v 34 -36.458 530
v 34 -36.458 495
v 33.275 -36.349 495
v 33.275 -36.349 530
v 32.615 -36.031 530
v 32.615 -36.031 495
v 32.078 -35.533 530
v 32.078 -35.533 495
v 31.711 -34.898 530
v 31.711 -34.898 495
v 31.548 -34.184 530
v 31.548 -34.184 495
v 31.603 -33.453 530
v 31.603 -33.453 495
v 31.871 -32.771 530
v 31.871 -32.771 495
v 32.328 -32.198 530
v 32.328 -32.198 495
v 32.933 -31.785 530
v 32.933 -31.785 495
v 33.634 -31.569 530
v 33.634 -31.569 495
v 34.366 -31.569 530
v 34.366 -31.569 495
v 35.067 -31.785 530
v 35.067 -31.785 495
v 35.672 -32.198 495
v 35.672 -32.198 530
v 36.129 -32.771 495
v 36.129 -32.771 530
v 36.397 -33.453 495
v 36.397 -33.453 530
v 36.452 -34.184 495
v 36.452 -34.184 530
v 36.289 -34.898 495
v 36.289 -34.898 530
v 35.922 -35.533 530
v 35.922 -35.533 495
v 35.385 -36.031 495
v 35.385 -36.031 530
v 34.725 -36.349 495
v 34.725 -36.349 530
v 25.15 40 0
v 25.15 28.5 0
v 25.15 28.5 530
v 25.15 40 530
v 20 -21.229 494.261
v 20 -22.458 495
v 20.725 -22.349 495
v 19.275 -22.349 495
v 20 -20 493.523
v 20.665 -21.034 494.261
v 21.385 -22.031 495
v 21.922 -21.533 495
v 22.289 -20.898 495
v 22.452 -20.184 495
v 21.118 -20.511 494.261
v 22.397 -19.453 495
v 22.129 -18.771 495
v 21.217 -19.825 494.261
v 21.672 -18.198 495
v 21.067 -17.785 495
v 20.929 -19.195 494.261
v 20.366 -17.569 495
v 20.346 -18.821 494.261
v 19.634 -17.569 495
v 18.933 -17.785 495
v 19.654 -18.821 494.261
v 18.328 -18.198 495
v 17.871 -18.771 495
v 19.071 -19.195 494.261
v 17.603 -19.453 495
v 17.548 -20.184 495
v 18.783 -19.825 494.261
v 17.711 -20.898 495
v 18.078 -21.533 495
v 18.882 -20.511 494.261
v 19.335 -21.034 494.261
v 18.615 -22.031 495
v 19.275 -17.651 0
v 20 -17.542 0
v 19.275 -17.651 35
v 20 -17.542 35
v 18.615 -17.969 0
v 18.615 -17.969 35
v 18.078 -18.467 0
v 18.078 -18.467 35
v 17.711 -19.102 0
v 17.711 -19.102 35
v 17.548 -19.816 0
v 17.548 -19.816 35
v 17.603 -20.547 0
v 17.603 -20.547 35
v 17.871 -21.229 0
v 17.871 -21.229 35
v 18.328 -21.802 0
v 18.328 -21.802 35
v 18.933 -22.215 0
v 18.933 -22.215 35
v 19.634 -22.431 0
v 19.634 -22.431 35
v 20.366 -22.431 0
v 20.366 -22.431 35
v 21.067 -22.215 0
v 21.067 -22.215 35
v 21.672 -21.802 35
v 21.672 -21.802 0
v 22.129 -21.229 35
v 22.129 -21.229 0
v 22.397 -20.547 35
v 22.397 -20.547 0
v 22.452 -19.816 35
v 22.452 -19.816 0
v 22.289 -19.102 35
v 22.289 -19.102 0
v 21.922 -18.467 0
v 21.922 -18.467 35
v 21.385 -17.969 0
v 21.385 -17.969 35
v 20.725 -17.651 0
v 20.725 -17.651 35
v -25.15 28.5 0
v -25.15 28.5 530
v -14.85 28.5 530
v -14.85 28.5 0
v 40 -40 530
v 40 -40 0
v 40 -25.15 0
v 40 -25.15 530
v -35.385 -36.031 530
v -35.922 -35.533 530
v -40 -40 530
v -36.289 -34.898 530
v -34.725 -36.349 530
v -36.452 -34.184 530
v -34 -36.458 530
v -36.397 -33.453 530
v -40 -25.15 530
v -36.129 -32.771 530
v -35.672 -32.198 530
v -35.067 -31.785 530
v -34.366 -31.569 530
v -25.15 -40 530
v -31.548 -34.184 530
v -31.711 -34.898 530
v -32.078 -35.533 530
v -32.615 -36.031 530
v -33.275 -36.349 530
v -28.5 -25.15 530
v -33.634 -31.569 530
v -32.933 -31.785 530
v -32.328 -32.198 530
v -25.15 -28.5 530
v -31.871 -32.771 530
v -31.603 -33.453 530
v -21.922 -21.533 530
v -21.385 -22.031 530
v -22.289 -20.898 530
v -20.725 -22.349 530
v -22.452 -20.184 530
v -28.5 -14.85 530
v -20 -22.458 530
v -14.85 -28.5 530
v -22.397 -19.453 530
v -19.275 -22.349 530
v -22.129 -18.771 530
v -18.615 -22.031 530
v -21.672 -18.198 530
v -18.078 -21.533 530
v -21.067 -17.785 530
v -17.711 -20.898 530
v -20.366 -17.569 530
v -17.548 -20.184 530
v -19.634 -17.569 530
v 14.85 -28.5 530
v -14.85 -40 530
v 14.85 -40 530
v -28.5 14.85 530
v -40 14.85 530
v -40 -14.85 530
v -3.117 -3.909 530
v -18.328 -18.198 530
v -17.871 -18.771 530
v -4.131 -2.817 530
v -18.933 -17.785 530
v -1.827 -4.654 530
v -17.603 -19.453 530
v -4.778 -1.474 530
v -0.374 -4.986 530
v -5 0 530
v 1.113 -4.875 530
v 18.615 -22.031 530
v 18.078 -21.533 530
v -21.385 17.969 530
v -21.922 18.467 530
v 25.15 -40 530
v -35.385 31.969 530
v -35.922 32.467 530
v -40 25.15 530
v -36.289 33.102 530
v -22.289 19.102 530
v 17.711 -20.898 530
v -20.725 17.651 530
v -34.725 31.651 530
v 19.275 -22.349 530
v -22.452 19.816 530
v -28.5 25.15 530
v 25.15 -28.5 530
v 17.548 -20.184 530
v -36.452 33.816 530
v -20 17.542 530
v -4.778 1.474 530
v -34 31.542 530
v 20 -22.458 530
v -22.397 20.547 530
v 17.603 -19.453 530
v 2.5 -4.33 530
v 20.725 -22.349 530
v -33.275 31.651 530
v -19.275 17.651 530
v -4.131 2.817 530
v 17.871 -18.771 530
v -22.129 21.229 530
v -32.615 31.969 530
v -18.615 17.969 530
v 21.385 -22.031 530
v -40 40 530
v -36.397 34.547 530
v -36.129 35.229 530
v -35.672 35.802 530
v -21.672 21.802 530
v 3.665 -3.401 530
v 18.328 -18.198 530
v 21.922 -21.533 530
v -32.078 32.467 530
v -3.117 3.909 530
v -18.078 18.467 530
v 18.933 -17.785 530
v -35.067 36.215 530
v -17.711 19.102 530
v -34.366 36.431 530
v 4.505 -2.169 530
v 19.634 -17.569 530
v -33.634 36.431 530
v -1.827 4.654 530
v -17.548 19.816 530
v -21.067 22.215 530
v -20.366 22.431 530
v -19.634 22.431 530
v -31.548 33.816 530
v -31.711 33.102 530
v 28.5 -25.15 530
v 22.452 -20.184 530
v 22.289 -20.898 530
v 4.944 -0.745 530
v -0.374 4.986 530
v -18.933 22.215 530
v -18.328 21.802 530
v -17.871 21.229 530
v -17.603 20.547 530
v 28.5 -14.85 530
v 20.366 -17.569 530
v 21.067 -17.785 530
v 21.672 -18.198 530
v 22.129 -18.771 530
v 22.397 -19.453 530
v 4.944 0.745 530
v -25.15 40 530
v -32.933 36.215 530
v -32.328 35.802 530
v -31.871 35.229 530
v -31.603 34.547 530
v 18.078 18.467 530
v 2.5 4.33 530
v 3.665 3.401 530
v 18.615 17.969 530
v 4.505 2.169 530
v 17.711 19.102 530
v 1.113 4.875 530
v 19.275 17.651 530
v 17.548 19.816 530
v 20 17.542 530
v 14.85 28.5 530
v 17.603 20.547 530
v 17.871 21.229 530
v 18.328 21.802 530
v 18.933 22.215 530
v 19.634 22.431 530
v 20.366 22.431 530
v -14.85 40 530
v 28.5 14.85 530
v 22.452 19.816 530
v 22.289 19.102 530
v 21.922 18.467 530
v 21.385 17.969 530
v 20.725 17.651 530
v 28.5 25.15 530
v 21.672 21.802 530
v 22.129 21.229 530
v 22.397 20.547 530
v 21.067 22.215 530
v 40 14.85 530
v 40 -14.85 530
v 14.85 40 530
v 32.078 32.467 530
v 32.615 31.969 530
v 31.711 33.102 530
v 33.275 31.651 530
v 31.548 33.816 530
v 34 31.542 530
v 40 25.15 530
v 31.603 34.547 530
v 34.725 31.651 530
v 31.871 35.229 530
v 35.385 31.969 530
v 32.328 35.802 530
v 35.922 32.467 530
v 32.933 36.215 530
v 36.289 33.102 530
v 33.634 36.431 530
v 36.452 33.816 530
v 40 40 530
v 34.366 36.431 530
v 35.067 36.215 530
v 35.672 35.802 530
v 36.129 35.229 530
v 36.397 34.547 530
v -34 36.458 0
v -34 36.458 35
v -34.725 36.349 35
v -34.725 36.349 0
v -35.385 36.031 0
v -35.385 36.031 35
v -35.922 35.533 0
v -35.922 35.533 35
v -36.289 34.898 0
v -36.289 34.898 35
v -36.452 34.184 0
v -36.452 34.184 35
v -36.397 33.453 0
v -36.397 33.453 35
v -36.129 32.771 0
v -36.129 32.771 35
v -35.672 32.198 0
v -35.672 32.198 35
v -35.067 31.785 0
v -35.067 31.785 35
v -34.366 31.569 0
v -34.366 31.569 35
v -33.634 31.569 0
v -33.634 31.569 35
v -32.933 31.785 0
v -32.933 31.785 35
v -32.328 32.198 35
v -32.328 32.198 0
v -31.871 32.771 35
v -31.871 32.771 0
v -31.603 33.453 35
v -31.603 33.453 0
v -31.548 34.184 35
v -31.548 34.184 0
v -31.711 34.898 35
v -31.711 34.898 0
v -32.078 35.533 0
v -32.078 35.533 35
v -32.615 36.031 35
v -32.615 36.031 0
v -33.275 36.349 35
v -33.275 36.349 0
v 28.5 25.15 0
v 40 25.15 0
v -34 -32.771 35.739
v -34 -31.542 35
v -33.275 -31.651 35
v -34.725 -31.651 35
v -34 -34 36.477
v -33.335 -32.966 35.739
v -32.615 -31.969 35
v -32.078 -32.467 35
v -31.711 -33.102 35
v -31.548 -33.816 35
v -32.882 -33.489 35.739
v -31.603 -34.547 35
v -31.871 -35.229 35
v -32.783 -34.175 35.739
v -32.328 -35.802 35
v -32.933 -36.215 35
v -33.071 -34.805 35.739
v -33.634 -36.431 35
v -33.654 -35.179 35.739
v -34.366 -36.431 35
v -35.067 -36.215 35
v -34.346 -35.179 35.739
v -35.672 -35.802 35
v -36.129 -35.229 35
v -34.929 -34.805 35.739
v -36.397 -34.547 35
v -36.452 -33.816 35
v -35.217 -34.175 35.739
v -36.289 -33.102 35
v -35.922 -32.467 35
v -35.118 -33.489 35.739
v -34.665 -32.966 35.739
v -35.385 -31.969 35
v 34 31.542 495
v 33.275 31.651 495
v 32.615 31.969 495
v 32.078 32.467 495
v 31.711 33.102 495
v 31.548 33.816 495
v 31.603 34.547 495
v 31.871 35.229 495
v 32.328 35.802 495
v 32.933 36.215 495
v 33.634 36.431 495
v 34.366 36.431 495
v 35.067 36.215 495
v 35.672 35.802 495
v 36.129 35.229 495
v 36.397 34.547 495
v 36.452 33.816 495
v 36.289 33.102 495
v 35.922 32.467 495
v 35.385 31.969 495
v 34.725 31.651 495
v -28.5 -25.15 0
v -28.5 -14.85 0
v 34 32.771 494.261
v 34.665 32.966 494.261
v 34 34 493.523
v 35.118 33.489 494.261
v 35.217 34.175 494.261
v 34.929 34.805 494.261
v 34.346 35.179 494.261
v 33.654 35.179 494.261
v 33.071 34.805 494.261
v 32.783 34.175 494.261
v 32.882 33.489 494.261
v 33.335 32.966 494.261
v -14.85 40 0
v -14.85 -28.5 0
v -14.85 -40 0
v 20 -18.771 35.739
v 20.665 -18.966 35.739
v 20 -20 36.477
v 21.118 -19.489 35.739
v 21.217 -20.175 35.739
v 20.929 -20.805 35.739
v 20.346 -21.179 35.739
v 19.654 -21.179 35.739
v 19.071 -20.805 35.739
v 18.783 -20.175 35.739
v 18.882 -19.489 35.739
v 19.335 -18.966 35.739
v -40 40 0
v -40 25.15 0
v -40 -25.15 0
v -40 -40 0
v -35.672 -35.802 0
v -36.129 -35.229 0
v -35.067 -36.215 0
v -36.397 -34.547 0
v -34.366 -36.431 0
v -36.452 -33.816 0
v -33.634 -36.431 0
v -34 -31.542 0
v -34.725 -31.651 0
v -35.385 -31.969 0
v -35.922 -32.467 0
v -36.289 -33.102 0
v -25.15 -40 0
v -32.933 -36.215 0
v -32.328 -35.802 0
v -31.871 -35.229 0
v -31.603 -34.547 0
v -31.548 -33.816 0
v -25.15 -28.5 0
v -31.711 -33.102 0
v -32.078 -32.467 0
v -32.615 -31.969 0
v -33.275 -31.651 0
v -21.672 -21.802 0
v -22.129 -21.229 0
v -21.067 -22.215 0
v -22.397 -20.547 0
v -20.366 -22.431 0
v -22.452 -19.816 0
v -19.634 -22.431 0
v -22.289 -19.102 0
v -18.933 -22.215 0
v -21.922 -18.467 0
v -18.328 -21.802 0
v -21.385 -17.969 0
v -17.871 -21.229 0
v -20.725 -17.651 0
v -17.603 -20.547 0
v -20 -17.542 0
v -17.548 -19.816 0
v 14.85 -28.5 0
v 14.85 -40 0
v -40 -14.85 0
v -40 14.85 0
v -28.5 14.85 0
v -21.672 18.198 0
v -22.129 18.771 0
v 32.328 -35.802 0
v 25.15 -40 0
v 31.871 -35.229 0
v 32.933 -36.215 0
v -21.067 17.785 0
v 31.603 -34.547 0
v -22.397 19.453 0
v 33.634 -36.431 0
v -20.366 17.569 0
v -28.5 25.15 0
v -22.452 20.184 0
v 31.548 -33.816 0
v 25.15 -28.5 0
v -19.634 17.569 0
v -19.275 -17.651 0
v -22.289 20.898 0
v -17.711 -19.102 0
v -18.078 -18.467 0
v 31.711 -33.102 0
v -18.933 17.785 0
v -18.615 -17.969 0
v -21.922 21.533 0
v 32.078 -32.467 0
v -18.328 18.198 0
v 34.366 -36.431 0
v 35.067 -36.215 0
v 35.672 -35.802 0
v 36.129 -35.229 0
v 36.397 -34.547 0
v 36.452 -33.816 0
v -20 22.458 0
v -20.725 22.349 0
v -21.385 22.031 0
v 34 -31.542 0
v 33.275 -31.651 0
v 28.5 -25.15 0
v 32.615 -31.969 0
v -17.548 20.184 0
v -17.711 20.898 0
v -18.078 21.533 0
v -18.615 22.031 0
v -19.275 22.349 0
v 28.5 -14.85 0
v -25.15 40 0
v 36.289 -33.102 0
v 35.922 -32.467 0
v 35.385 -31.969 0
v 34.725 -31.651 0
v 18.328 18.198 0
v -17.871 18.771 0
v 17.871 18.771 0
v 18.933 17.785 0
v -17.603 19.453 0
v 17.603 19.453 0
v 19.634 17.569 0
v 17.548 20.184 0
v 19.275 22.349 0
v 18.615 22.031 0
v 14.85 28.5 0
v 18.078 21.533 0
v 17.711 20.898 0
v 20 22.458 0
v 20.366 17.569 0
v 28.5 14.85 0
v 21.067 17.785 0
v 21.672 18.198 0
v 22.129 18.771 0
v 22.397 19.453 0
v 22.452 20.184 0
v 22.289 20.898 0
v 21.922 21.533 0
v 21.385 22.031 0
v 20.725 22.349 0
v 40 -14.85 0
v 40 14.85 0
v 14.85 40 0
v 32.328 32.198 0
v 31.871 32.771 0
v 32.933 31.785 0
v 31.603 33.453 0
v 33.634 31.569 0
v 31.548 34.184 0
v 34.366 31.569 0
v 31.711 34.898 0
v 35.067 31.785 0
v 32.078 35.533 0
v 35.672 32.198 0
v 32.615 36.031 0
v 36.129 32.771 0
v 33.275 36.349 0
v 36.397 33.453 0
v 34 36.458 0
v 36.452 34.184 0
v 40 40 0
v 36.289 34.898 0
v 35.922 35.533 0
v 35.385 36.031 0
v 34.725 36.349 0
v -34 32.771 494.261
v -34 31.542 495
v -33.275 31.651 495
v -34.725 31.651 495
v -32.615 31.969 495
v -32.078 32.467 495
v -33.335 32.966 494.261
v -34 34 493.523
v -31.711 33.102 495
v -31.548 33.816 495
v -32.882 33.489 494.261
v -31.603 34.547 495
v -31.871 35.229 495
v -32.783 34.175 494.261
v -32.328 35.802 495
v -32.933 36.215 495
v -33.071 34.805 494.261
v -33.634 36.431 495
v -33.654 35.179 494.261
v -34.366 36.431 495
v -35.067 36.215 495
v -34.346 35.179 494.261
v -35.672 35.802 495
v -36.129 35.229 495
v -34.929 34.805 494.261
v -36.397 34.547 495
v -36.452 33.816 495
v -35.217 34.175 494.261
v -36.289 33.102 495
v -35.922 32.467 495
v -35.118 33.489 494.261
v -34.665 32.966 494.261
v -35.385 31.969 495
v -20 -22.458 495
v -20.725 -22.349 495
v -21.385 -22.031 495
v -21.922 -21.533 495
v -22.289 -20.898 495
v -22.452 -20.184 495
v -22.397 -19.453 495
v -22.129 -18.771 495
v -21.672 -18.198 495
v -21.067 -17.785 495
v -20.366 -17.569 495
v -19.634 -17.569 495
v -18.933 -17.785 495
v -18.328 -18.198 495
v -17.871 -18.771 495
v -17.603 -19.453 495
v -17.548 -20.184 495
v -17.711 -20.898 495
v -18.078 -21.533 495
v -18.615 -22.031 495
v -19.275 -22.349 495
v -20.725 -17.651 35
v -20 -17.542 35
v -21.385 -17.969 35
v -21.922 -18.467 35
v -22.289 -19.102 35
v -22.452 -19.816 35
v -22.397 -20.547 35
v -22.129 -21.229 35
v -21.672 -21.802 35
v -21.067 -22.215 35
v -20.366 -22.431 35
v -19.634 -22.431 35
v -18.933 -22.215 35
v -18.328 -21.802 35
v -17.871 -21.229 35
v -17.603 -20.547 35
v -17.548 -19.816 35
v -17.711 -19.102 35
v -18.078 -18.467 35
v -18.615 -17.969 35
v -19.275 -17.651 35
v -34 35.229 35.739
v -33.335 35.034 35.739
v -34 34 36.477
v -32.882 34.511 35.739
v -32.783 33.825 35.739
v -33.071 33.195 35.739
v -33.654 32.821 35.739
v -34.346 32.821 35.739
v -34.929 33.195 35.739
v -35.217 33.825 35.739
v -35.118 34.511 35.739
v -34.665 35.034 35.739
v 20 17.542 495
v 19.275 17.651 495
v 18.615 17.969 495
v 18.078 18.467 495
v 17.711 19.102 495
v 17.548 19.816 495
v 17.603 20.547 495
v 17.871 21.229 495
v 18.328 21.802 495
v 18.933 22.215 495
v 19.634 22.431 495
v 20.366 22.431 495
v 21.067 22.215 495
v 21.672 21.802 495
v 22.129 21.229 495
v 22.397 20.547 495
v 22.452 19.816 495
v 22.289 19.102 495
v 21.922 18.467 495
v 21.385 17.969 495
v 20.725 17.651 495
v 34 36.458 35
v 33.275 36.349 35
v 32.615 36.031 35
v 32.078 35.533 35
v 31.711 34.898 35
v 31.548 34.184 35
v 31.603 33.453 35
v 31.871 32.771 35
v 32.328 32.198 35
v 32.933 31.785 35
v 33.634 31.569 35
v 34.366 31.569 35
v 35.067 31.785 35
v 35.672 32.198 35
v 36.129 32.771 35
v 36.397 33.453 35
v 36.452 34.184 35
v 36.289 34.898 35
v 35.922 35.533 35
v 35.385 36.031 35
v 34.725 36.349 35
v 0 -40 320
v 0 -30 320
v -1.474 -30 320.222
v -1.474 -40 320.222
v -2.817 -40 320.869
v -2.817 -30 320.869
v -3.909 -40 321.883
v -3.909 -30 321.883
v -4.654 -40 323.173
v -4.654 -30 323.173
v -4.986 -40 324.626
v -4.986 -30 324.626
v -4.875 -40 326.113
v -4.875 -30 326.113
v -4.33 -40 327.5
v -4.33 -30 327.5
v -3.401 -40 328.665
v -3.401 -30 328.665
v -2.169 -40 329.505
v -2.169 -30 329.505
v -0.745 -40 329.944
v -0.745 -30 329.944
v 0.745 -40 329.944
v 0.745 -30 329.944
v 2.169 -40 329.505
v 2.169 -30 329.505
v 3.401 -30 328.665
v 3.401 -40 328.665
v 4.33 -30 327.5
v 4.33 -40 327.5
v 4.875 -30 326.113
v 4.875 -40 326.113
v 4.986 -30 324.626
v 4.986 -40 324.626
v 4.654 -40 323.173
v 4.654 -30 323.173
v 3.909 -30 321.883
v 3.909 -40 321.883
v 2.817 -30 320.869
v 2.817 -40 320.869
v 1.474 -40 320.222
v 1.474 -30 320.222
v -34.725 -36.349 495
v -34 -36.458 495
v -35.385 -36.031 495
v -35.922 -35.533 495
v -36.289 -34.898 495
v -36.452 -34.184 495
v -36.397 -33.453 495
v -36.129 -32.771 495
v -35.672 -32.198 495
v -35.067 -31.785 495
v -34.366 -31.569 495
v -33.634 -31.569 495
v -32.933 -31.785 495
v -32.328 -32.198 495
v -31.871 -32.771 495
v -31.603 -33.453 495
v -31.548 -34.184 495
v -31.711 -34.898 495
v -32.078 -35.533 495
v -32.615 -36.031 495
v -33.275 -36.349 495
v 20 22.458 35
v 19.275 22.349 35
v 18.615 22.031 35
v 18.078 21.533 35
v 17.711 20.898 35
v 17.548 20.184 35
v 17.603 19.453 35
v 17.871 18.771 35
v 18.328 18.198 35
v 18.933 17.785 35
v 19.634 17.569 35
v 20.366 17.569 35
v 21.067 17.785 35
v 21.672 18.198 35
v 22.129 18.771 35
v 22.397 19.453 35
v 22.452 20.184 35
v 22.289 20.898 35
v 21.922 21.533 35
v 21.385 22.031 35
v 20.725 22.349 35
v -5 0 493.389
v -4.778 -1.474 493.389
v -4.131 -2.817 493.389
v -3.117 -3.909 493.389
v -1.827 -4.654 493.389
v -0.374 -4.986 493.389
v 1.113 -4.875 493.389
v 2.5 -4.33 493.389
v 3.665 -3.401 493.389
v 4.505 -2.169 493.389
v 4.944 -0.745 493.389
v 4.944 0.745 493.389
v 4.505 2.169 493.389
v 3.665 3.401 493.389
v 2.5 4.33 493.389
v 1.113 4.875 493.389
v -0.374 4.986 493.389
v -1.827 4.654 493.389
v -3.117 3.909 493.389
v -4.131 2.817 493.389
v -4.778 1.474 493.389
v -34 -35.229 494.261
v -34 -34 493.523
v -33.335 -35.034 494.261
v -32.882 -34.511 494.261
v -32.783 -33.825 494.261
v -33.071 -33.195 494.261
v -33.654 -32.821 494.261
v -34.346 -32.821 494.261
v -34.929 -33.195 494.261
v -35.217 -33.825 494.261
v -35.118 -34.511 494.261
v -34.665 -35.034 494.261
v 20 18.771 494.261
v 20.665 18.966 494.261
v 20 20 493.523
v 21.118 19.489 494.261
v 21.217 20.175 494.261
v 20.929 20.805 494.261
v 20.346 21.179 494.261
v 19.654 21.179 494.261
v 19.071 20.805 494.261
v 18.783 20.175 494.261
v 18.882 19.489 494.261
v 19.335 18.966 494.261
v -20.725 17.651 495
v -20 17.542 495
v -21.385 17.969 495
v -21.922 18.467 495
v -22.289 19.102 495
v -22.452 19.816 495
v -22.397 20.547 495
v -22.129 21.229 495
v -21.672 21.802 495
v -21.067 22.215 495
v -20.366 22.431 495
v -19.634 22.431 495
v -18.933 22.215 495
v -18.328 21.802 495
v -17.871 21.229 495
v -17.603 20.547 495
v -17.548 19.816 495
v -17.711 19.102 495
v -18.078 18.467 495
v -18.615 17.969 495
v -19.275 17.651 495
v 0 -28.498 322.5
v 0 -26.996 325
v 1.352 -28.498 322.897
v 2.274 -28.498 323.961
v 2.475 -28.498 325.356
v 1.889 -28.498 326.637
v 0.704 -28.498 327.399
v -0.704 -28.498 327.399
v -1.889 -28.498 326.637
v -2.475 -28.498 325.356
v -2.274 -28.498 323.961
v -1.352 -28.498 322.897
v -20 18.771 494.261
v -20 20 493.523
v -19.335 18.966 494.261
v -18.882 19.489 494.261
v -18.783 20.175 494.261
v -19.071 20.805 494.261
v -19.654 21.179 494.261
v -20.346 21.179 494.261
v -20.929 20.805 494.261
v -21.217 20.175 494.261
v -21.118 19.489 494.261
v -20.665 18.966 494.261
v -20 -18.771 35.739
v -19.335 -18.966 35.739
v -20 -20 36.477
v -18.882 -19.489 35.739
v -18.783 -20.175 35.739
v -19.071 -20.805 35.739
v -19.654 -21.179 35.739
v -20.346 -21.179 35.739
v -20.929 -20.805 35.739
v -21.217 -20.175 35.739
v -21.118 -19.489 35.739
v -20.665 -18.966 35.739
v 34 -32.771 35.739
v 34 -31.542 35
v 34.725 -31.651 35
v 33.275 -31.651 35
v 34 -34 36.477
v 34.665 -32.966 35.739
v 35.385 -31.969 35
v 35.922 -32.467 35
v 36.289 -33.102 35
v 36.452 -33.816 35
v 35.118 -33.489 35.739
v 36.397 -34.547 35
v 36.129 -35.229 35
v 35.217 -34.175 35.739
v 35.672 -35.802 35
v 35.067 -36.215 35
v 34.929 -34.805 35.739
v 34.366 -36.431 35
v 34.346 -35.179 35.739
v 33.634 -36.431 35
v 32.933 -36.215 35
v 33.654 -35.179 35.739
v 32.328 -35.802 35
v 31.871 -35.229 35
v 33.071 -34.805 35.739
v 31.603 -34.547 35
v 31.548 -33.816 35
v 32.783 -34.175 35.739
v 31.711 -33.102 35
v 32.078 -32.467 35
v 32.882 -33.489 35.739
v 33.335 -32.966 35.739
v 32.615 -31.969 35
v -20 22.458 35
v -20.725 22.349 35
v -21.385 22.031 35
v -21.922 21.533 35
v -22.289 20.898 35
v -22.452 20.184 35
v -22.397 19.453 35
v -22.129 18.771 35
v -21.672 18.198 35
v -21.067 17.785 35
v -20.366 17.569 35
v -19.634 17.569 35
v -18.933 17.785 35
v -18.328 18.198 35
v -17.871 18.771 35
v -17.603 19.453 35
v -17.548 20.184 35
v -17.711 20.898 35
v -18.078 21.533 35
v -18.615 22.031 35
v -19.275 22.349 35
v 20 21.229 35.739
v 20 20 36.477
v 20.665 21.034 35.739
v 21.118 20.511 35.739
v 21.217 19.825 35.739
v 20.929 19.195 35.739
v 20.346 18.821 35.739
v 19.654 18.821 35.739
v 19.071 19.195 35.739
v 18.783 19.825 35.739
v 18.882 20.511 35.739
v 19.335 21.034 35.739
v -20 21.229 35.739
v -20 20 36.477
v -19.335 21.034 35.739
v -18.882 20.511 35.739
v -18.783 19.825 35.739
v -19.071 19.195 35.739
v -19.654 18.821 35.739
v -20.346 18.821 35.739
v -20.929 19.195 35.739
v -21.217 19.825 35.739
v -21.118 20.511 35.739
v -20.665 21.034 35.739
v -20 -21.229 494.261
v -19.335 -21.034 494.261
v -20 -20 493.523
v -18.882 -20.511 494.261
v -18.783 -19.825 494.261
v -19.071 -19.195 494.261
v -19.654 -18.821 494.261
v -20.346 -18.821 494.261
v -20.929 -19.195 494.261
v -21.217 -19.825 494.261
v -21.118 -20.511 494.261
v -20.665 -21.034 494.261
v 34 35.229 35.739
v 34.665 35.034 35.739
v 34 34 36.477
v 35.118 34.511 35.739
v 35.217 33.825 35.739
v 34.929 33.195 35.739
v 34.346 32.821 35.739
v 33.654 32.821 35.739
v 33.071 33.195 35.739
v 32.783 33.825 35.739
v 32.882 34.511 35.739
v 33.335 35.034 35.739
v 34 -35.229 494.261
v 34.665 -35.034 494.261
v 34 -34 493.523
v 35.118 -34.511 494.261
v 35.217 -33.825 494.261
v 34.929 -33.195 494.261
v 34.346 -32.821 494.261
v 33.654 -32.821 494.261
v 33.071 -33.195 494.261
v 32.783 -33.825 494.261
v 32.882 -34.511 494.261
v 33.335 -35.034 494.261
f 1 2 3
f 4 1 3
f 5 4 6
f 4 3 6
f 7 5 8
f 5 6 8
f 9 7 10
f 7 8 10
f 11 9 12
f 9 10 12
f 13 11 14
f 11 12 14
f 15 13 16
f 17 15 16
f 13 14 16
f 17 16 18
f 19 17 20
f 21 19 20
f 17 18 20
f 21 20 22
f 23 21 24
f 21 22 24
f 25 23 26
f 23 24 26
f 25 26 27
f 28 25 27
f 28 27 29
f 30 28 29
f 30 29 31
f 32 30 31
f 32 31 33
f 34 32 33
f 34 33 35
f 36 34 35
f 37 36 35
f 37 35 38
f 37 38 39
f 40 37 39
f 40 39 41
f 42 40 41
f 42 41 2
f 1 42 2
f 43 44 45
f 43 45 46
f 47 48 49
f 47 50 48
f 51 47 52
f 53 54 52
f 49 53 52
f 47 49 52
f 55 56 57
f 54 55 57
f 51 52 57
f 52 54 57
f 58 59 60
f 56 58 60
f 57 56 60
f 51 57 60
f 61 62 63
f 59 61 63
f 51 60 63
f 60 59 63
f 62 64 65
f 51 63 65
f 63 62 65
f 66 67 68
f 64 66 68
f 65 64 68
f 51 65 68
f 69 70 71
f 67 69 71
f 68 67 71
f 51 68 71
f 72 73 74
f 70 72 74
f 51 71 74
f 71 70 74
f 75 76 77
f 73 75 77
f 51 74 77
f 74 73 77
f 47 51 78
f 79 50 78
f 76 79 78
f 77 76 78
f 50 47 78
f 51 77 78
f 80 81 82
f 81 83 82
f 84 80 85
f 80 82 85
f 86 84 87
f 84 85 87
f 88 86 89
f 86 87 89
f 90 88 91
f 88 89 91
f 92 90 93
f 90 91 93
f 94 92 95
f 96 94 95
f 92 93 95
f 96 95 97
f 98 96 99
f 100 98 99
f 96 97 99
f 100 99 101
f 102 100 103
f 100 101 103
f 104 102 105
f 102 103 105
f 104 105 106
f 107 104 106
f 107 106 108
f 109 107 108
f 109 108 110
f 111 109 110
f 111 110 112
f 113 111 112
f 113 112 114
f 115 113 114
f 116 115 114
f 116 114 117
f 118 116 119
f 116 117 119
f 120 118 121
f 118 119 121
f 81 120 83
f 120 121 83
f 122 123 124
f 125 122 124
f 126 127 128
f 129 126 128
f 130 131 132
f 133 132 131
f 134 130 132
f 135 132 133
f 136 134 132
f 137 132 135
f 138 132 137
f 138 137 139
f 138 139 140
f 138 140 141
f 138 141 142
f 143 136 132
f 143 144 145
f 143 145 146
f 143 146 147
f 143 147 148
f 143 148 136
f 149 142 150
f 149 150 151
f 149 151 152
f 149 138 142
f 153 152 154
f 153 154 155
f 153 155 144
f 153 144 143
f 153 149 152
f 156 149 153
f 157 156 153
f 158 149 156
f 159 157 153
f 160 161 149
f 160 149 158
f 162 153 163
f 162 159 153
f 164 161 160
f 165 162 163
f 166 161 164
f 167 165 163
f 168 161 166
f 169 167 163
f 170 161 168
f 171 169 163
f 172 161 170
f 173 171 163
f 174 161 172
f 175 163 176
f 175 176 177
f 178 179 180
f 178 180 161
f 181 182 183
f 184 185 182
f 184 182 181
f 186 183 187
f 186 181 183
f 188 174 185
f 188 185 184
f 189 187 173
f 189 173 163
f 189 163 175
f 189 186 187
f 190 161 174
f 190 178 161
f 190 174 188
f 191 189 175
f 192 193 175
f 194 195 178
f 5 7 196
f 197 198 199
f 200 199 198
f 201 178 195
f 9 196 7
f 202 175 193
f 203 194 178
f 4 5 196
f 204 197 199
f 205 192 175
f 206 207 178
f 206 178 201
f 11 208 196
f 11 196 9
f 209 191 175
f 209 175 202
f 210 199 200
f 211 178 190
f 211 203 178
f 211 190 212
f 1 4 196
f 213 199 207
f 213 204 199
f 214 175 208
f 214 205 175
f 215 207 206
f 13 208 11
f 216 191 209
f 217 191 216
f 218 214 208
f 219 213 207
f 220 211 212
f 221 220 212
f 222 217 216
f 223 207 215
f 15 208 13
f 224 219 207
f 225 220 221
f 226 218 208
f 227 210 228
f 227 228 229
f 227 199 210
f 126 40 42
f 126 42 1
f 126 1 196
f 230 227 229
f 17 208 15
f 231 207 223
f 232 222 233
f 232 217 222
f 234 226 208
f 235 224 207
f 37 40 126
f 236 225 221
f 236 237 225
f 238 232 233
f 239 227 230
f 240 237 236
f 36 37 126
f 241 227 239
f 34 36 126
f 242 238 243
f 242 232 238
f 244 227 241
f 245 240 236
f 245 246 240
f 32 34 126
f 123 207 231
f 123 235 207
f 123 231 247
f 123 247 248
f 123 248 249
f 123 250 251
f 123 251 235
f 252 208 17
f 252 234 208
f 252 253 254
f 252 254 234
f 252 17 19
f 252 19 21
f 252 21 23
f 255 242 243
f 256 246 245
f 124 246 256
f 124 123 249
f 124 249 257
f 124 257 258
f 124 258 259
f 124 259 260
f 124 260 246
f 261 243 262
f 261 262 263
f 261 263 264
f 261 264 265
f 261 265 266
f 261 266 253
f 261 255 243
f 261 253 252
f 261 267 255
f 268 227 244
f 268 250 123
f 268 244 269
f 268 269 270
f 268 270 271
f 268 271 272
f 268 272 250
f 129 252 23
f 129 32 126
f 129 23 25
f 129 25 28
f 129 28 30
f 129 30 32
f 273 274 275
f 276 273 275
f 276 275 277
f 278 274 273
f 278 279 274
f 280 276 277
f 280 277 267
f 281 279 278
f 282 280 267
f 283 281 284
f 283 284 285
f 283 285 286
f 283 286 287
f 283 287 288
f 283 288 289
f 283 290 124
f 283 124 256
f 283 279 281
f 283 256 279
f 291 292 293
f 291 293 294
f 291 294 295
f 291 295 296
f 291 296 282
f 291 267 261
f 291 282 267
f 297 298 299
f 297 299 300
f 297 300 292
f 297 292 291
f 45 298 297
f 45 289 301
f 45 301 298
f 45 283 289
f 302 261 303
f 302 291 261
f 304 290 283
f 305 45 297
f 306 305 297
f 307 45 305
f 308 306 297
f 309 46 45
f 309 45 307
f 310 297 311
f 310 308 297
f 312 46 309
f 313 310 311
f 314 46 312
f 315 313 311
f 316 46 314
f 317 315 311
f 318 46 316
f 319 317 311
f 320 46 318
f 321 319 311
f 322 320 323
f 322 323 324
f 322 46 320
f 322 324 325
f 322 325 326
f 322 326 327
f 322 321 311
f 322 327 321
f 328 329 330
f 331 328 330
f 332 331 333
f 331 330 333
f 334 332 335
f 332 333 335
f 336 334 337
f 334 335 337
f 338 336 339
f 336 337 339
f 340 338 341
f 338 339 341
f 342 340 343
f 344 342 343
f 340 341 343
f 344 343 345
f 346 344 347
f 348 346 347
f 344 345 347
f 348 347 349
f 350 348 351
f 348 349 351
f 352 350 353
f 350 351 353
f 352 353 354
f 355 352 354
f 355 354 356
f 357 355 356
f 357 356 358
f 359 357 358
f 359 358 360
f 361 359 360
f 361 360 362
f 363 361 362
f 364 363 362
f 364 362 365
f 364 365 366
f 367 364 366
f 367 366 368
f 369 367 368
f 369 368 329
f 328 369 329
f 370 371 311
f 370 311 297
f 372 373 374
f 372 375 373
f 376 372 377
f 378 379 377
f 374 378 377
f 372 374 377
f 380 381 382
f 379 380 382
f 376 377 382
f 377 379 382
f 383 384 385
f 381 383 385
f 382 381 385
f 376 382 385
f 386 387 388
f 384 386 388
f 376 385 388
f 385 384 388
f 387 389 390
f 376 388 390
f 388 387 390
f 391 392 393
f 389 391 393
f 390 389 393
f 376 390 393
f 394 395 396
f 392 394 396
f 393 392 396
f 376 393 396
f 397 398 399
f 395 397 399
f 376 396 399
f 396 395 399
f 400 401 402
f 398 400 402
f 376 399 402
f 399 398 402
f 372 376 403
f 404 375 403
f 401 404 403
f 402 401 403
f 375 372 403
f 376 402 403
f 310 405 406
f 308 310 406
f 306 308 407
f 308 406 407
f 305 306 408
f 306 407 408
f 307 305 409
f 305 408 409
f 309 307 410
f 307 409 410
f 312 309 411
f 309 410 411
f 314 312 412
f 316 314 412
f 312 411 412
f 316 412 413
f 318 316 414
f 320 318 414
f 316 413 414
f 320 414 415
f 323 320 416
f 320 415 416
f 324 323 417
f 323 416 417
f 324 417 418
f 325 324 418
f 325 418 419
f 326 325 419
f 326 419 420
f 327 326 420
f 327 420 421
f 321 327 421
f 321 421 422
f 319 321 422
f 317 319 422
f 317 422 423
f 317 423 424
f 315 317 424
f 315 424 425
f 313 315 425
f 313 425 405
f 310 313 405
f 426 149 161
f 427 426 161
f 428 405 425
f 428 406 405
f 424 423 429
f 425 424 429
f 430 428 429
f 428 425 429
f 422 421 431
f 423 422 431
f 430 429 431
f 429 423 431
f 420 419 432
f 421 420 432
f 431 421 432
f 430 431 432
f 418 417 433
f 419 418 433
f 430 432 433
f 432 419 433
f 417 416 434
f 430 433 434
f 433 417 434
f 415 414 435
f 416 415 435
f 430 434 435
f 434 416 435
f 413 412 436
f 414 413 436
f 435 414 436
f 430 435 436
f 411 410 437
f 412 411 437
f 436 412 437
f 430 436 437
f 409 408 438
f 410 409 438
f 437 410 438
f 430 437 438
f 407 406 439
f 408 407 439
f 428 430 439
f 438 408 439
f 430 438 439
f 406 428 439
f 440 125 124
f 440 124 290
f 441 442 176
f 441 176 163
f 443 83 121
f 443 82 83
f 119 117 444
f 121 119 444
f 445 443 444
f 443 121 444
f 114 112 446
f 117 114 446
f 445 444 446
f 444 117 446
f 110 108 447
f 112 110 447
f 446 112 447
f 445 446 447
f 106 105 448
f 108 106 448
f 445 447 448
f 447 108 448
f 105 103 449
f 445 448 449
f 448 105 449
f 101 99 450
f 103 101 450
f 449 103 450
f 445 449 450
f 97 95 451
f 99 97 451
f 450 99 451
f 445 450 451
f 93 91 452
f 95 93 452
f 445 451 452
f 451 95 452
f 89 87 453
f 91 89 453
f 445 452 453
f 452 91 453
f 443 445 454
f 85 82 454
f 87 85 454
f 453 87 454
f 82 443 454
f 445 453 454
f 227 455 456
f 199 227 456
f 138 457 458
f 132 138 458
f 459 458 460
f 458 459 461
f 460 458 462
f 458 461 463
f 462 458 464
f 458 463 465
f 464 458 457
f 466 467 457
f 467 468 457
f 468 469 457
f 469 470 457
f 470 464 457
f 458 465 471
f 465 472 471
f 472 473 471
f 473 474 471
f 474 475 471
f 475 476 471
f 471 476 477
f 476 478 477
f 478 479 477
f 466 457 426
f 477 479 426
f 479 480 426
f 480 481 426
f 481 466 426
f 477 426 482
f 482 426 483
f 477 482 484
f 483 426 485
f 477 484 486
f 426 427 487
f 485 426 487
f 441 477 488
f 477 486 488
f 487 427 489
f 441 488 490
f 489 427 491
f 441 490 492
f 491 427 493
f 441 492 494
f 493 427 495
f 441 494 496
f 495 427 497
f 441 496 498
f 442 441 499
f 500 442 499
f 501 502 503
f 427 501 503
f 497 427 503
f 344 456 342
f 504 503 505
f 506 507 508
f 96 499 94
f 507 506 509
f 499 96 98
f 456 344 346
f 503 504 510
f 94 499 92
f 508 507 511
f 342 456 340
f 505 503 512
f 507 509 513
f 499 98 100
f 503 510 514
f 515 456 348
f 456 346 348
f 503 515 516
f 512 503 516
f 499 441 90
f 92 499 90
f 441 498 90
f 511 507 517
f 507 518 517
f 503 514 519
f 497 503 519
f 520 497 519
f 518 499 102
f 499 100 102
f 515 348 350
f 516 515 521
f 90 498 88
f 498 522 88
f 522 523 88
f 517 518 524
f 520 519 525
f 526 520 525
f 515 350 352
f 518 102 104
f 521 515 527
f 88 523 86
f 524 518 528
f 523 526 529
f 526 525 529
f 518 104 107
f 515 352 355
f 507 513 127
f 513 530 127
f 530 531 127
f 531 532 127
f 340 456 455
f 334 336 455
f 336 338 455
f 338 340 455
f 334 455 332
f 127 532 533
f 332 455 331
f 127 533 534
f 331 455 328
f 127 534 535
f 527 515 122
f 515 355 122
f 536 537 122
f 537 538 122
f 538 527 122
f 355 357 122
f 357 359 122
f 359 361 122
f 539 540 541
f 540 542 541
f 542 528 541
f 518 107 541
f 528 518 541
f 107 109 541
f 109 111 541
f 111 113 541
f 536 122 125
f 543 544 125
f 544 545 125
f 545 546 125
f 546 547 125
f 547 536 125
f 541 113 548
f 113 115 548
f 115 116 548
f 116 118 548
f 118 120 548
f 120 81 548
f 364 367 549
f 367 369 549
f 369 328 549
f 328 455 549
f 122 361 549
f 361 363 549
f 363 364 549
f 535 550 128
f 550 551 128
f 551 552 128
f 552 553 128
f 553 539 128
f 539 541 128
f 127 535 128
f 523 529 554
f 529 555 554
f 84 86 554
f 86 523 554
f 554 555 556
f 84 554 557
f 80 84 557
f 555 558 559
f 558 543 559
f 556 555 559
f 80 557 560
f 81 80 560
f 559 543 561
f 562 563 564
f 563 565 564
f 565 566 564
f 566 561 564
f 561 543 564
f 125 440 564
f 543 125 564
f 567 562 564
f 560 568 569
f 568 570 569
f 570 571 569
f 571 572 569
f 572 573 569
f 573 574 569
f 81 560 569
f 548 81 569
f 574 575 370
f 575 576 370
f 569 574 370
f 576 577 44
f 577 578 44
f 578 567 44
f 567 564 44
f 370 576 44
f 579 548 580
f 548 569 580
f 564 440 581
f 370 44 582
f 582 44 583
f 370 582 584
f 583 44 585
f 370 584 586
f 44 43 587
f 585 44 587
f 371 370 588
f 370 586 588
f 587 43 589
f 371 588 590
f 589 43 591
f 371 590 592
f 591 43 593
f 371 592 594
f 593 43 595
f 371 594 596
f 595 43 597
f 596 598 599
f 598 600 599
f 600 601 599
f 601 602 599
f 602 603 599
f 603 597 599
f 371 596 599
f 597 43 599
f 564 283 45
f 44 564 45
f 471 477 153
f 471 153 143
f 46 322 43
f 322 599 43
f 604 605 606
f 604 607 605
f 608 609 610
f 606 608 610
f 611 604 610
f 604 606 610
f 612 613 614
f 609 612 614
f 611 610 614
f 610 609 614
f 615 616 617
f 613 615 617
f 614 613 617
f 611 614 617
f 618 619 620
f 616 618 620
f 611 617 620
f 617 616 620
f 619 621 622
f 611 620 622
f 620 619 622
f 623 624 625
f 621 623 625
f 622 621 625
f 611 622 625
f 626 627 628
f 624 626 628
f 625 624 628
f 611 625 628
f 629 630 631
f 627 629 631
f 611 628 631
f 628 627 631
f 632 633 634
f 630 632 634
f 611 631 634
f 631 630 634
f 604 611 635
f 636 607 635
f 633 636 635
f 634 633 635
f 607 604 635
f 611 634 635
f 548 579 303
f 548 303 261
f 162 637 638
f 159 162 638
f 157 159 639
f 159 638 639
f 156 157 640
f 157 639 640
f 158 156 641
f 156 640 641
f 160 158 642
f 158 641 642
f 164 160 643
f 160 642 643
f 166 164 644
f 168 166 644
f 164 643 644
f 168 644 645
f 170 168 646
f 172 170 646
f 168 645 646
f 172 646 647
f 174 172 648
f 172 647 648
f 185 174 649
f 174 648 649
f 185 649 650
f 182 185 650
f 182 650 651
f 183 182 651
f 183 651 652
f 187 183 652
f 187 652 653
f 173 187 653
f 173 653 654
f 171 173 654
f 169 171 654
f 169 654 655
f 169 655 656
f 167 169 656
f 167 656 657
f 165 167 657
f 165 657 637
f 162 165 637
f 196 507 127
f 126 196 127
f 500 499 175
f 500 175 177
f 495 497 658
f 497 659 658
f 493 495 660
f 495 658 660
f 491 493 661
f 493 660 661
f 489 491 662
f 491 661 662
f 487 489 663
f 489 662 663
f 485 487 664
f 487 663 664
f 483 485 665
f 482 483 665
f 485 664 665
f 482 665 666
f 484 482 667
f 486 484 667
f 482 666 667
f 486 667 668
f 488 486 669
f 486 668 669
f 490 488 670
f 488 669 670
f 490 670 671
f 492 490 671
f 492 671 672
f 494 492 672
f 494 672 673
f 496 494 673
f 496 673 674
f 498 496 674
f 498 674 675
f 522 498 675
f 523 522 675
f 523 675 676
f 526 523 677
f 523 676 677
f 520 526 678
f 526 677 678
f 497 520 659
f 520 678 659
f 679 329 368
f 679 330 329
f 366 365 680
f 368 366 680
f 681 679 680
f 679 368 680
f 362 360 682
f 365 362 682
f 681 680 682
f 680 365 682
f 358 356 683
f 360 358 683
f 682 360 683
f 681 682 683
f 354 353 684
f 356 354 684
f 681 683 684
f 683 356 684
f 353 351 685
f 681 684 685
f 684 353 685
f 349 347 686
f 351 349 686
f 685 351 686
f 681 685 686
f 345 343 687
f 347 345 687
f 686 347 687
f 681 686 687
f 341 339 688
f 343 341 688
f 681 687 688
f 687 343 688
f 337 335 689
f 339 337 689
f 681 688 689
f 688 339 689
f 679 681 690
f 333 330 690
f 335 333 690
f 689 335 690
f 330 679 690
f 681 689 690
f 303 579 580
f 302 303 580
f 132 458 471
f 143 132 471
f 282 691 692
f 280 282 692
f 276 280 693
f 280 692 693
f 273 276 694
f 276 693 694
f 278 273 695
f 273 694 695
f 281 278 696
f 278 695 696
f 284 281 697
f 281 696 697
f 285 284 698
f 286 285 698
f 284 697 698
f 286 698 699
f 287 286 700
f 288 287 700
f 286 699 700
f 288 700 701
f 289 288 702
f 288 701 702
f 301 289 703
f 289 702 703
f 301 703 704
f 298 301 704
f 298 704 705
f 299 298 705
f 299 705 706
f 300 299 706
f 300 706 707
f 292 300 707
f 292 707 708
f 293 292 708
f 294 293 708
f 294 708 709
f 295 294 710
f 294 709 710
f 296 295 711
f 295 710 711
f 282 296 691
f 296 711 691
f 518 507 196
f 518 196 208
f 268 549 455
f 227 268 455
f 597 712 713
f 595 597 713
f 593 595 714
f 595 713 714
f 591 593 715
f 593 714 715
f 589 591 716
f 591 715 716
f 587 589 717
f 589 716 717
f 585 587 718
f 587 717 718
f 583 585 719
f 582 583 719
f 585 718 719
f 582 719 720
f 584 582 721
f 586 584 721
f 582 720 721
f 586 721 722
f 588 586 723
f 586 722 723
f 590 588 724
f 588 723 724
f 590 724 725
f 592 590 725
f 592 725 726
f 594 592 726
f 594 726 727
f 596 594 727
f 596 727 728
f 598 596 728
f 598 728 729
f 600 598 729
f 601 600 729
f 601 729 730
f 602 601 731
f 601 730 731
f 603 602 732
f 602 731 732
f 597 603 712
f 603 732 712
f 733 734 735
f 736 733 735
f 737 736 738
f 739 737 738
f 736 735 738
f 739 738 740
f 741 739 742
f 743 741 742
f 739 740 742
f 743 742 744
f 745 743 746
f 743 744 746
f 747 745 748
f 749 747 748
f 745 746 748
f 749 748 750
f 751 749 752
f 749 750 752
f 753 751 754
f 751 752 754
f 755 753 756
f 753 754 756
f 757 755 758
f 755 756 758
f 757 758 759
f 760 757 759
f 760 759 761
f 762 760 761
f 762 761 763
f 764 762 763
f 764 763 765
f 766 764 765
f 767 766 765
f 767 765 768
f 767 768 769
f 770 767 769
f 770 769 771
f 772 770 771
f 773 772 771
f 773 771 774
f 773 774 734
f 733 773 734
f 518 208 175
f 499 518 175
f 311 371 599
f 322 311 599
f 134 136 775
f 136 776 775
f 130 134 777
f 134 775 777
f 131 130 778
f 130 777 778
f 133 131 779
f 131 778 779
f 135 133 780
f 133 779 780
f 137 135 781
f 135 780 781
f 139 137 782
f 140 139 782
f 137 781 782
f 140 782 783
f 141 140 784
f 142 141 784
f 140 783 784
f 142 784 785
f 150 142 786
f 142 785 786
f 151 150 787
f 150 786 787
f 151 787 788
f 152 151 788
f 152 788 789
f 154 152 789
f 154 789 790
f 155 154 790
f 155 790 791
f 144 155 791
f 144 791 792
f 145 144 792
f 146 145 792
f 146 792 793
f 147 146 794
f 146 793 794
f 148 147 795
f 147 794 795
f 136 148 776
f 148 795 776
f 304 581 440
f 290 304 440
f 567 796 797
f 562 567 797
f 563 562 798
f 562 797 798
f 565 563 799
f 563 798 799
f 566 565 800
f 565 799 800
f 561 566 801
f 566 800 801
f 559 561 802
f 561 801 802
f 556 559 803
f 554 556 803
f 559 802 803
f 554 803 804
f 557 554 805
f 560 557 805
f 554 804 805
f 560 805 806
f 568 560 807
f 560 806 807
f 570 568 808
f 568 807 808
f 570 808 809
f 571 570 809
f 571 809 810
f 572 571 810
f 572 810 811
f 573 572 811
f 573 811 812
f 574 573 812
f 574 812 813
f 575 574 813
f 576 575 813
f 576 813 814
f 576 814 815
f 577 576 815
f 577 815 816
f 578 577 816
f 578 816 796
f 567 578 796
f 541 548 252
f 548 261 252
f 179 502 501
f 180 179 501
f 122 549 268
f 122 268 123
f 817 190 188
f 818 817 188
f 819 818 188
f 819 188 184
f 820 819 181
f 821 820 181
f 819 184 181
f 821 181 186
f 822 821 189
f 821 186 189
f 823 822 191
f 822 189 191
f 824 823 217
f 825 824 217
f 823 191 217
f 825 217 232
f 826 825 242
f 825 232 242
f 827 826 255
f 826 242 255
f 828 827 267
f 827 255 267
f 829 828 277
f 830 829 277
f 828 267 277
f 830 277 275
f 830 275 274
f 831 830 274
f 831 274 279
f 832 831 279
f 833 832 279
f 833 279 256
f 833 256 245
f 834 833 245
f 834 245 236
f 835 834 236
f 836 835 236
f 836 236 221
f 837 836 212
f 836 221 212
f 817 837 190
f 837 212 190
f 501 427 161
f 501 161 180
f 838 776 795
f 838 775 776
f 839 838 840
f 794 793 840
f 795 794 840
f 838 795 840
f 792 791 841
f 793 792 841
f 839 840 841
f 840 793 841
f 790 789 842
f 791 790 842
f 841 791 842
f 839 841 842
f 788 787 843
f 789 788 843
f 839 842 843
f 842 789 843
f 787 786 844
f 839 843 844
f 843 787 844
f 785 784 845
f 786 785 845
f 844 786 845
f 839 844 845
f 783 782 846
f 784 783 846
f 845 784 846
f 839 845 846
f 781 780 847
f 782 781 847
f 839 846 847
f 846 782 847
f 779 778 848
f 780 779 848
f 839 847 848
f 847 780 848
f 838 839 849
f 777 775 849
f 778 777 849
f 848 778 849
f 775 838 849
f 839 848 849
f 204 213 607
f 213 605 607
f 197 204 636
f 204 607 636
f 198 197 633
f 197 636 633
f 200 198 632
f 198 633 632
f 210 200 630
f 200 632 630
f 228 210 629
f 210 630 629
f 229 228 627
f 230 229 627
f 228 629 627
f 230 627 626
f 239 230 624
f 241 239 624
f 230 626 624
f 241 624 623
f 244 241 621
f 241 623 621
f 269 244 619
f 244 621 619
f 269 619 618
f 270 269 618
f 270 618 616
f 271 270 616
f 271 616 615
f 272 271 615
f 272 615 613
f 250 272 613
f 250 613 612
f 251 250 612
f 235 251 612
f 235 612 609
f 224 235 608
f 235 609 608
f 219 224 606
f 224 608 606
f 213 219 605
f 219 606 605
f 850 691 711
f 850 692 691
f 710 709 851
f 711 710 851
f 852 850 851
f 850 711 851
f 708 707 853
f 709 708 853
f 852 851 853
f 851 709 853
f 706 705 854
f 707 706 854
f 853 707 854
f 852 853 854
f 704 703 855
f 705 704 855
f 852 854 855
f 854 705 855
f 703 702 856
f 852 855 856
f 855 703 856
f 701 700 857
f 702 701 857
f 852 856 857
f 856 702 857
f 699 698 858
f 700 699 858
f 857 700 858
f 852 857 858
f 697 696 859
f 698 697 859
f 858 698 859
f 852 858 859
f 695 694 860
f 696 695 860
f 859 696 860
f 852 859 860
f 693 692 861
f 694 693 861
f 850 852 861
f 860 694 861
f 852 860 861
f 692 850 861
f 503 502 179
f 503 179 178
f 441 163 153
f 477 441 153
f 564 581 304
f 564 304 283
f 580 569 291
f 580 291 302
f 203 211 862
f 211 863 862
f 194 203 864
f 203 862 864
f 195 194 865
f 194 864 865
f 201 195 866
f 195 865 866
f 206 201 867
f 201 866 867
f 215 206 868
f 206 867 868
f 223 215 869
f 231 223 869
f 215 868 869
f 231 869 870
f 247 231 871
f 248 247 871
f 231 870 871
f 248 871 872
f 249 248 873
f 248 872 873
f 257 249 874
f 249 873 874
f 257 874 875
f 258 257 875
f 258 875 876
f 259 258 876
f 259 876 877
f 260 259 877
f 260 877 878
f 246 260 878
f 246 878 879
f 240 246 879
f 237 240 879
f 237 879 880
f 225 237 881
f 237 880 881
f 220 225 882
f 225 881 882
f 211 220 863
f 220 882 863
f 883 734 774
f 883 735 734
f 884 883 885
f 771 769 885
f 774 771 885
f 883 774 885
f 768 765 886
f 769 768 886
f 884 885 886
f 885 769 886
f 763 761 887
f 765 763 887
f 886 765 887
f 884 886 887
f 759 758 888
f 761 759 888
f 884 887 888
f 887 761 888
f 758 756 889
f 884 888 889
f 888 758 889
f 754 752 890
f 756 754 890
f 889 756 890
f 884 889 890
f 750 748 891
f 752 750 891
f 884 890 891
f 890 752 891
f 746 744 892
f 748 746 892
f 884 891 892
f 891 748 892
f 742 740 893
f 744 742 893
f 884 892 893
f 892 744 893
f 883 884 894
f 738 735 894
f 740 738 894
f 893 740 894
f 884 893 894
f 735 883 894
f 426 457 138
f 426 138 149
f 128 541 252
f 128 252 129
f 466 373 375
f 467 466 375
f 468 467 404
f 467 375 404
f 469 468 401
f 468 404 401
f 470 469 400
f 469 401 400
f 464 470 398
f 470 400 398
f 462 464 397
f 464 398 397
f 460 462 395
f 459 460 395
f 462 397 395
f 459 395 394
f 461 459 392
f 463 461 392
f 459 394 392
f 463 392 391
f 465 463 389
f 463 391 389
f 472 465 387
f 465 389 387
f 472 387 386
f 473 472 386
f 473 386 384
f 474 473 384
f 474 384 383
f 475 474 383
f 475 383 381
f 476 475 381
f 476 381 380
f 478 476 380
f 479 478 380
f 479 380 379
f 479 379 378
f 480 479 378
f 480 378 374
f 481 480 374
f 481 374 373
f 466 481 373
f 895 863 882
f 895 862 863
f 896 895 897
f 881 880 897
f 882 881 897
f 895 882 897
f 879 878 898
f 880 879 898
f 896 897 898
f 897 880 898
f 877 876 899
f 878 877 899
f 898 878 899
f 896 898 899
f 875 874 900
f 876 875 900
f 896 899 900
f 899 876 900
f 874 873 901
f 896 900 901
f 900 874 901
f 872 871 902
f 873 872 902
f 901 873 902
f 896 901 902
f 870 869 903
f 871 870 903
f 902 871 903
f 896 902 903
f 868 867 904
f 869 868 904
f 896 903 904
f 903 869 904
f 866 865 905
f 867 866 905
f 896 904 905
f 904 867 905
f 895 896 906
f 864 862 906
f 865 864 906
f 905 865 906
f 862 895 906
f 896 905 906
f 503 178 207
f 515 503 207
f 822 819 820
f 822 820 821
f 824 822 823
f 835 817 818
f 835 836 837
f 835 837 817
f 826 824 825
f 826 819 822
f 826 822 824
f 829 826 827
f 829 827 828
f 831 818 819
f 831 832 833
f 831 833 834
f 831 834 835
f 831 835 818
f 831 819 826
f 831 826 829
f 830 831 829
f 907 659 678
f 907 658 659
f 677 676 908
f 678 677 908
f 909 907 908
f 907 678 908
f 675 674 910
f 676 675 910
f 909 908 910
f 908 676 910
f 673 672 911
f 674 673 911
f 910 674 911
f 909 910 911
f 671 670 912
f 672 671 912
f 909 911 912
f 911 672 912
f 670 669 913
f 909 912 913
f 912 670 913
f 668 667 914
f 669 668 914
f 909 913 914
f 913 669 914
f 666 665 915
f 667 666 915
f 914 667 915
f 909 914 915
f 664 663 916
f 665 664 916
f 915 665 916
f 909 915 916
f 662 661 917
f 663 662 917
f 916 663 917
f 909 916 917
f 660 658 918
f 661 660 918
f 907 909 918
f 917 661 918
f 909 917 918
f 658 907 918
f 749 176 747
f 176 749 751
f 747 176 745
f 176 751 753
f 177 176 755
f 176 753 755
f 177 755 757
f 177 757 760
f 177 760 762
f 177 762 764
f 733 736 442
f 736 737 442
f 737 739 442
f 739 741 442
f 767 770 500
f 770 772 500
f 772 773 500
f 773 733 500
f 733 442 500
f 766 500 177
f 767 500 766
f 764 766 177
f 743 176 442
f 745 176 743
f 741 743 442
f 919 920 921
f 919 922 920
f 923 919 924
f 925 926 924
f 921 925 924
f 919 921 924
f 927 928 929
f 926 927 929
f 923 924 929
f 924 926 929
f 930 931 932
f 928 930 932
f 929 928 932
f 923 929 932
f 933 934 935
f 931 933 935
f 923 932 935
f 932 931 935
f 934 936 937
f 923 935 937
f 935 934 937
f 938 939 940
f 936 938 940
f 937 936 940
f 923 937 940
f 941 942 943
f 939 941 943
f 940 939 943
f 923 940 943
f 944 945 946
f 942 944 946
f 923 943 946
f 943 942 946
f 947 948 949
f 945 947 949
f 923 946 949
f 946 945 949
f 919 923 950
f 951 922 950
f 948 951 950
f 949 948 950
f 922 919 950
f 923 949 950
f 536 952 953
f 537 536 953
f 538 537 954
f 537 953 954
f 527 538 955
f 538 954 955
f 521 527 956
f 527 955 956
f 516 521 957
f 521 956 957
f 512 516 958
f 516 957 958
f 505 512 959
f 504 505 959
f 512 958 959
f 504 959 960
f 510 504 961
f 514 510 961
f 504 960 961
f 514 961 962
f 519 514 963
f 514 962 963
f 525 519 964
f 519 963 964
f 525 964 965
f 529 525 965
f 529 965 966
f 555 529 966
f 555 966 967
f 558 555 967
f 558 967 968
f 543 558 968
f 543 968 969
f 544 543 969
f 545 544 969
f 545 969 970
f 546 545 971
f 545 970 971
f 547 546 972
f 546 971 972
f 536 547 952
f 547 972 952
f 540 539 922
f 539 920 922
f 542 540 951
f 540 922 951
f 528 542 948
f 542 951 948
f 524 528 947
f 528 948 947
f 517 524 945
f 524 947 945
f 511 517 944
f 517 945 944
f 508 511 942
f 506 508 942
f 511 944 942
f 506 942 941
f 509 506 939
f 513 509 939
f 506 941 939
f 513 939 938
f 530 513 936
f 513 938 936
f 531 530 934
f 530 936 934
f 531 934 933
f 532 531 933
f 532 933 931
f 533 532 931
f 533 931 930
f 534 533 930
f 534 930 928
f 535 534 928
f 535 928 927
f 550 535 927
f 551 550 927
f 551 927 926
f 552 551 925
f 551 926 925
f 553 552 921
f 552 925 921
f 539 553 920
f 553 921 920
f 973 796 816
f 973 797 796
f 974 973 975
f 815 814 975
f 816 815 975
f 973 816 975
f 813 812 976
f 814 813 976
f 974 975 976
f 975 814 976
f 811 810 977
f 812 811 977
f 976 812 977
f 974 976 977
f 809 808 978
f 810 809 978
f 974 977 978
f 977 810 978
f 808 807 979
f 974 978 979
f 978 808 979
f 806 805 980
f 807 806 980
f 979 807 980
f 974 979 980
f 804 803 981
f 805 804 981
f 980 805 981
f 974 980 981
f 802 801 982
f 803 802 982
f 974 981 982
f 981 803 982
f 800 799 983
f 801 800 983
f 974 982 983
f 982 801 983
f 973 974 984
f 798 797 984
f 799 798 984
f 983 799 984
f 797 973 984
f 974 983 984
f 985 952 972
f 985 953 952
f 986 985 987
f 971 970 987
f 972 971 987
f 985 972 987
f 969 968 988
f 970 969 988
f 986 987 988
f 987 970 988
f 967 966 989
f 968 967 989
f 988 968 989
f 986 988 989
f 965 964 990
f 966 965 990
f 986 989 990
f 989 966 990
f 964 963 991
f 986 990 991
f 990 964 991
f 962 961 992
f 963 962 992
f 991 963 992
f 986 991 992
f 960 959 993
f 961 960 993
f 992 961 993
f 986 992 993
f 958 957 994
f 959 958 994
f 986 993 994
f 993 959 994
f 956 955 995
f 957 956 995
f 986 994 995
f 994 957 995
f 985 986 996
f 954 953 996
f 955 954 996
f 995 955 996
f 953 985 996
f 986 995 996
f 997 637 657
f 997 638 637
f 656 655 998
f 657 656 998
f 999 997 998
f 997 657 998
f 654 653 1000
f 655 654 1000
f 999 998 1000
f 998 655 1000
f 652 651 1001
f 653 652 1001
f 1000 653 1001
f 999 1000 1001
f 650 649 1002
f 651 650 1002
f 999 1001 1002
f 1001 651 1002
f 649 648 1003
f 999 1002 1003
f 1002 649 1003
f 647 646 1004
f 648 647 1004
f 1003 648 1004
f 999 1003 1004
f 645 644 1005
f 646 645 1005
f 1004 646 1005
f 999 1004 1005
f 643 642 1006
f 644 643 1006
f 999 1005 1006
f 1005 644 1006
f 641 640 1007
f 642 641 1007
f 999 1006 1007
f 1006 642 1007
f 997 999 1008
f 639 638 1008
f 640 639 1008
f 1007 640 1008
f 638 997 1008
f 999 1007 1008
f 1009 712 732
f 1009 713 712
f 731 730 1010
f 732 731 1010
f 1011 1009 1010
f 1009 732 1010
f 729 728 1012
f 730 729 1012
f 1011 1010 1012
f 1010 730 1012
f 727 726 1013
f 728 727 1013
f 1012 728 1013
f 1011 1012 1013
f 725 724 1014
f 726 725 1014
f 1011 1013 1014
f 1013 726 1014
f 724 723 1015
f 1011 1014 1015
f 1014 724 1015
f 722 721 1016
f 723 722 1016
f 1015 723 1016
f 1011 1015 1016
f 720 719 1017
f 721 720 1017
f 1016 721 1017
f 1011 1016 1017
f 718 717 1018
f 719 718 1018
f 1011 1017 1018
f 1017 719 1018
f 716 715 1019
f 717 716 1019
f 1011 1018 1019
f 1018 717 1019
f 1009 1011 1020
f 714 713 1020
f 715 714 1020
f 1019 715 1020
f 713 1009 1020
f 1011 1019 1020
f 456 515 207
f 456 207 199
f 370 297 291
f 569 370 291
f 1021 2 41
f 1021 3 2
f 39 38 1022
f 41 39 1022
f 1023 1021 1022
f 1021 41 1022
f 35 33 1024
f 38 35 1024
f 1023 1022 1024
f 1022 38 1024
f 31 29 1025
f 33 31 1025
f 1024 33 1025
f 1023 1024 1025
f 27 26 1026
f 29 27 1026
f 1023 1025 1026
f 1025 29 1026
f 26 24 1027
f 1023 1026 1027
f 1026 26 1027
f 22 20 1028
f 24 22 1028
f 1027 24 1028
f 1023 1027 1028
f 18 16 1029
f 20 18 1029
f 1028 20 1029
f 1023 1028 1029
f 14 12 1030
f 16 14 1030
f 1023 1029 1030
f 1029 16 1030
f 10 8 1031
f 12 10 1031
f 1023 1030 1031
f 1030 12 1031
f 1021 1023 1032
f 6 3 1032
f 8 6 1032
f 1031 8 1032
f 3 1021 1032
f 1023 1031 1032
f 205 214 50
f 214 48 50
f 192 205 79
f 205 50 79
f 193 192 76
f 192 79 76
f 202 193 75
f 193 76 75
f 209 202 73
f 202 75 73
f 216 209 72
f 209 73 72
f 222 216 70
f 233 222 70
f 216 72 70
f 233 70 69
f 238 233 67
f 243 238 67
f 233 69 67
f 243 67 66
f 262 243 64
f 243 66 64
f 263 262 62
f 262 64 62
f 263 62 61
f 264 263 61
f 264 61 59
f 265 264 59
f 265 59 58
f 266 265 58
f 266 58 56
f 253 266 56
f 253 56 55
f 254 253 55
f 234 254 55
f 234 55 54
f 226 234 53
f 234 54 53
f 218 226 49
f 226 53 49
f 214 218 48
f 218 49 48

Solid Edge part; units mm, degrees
sketch "Sketch1" plane through (0, 0, 0) normal (0, 0, 1) x (1, 0, 0)
  line L0 (40, -40) -> (40, 40)
  line L1 (40, 40) -> (-40, 40)
  line L2 (-40, 40) -> (-40, -40)
  line L3 (-40, -40) -> (40, -40)
extrude "Protrusion1" add sketch "Sketch1" along normal blind 530
extrude "Extrusionsausschnitt_1" [suppressed]
sketch "Sketch2" plane through (40, 0, 350) normal (1, 0, 0) x (0, 0, 1)
  circle A0 centre (50, 90) radius 60
  circle A1 centre (50, 90) radius 40
  dimension "D1" = 90
  dimension "D2" = 120
  dimension "D3" = 80
  dimension "D4" = 400
extrude "Protrusion2" add sketch "Sketch2" against normal up to vertex (80 mm away)
sketch "Sketch3" plane through (40, -55, 350) normal (1, 0, 0) x (0, 0, 1)
  line L0 (-10, 5) -> (-40, 5)
  line L1 (-40, 5) -> (-40, -15)
  line L2 (-40, -15) -> (26.1282, -15)
  line L3 (26.1282, -15) -> (-10, 35)
  line L4 (-10, 35) -> (-10, 5)
extrude "Protrusion3" add sketch "Sketch3" against normal up to vertex (80 mm away)
hole "Bohrung_1" at (0, -60, 325) direction (0, 1, 0) diameter 10 depth 30 tip angle 118 counterbore diameter 15 counterbore depth 8.8
mirror "Mirror1" [suppressed]
sketch "Sketch4" plane through (0, 0, 530) normal (0, 0, 1) x (-1, 0, 0)
  circle A0 centre (0, 0) radius 5
extrude "Extrusionsausschnitt_2" cut sketch "Sketch4" against normal blind 36.6109
sketch "Sketch5" plane through (0, 0, 530) normal (0, 0, 1) x (1, 0, 0)
  line L0 (28.5, -25.15) -> (40, -25.15)
  line L1 (40, -25.15) -> (40, -14.85)
  line L2 (40, -14.85) -> (28.5, -14.85)
  line L3 (28.5, -14.85) -> (28.5, -25.15)
  line L4 (28.5, 14.85) -> (40, 14.85)
  line L5 (40, 14.85) -> (40, 25.15)
  line L6 (40, 25.15) -> (28.5, 25.15)
  line L7 (28.5, 25.15) -> (28.5, 14.85)
  dimension "D1" = 10.3
  dimension "D2" = 11.5
  dimension "D3" = 20
  dimension "D4" = 20
extrude "Cutout1" cut sketch "Sketch5" against normal up to vertex (530 mm away)
sketch "Sketch6" plane through (0, 0, 530) normal (0, 0, 1) x (1, 0, 0)
  line L0 (-86.4024, -164.9595) -> (86.4024, -164.9595)
  line L1 (86.4024, -164.9595) -> (86.4024, -40)
  line L2 (86.4024, -40) -> (-86.4024, -40)
  line L3 (-86.4024, -40) -> (-86.4024, -164.9595)
extrude "Extrusionsausschnitt_4" cut sketch "Sketch6" against normal blind 227.9971
mirror "Mirror2" about plane through (-6.1475, 6.1475, 8.6939) normal (0.7071, 0.7071, 0) of "Cutout1"
mirror "Mirror3" about plane through (0, 0, 0) normal (1, 0, 0) of "Cutout1"
mirror "Mirror4" about plane through (0, 0, 0) normal (0, -1, 0) of "Mirror2"
hole "Bohrung_2" at (-34, -34, 0) direction (0, 0, 1) diameter 4.917 depth 35 tip angle 118 thread major 6 thread length 30
hole "Hole1" at (34, -34, 0) direction (0, 0, 1) diameter 4.917 depth 35 tip angle 118 thread major 6 thread length 30
hole "Hole2" at (34, 34, 0) direction (0, 0, 1) diameter 4.917 depth 35 tip angle 118 thread major 6 thread length 30
hole "Hole3" at (-34, 34, 0) direction (0, 0, 1) diameter 4.917 depth 35 tip angle 118 thread major 6 thread length 30
hole "Hole4" at (-20, -20, 0) direction (0, 0, 1) diameter 4.917 depth 35 tip angle 118 thread major 6 thread length 30
hole "Hole5" at (20, -20, 0) direction (0, 0, 1) diameter 4.917 depth 35 tip angle 118 thread major 6 thread length 30
hole "Hole6" at (20, 20, 0) direction (0, 0, 1) diameter 4.917 depth 35 tip angle 118 thread major 6 thread length 30
hole "Hole7" at (-20, 20, 0) direction (0, 0, 1) diameter 4.917 depth 35 tip angle 118 thread major 6 thread length 30
hole "Bohrung_6" at (-34, 34, 530) direction (0, 0, -1) diameter 4.917 depth 35 tip angle 118 thread major 6 thread length 30
hole "Hole8" at (-34, -34, 530) direction (0, 0, -1) diameter 4.917 depth 35 tip angle 118 thread major 6 thread length 30
hole "Hole9" at (34, 34, 530) direction (0, 0, -1) diameter 4.917 depth 35 tip angle 118 thread major 6 thread length 30
hole "Hole10" at (34, -34, 530) direction (0, 0, -1) diameter 4.917 depth 35 tip angle 118 thread major 6 thread length 30
hole "Hole11" at (-20, -20, 530) direction (0, 0, -1) diameter 4.917 depth 35 tip angle 118 thread major 6 thread length 30
hole "Hole12" at (-20, 20, 530) direction (0, 0, -1) diameter 4.917 depth 35 tip angle 118 thread major 6 thread length 30
hole "Hole13" at (20, 20, 530) direction (0, 0, -1) diameter 4.917 depth 35 tip angle 118 thread major 6 thread length 30
hole "Hole14" at (20, -20, 530) direction (0, 0, -1) diameter 4.917 depth 35 tip angle 118 thread major 6 thread length 30
